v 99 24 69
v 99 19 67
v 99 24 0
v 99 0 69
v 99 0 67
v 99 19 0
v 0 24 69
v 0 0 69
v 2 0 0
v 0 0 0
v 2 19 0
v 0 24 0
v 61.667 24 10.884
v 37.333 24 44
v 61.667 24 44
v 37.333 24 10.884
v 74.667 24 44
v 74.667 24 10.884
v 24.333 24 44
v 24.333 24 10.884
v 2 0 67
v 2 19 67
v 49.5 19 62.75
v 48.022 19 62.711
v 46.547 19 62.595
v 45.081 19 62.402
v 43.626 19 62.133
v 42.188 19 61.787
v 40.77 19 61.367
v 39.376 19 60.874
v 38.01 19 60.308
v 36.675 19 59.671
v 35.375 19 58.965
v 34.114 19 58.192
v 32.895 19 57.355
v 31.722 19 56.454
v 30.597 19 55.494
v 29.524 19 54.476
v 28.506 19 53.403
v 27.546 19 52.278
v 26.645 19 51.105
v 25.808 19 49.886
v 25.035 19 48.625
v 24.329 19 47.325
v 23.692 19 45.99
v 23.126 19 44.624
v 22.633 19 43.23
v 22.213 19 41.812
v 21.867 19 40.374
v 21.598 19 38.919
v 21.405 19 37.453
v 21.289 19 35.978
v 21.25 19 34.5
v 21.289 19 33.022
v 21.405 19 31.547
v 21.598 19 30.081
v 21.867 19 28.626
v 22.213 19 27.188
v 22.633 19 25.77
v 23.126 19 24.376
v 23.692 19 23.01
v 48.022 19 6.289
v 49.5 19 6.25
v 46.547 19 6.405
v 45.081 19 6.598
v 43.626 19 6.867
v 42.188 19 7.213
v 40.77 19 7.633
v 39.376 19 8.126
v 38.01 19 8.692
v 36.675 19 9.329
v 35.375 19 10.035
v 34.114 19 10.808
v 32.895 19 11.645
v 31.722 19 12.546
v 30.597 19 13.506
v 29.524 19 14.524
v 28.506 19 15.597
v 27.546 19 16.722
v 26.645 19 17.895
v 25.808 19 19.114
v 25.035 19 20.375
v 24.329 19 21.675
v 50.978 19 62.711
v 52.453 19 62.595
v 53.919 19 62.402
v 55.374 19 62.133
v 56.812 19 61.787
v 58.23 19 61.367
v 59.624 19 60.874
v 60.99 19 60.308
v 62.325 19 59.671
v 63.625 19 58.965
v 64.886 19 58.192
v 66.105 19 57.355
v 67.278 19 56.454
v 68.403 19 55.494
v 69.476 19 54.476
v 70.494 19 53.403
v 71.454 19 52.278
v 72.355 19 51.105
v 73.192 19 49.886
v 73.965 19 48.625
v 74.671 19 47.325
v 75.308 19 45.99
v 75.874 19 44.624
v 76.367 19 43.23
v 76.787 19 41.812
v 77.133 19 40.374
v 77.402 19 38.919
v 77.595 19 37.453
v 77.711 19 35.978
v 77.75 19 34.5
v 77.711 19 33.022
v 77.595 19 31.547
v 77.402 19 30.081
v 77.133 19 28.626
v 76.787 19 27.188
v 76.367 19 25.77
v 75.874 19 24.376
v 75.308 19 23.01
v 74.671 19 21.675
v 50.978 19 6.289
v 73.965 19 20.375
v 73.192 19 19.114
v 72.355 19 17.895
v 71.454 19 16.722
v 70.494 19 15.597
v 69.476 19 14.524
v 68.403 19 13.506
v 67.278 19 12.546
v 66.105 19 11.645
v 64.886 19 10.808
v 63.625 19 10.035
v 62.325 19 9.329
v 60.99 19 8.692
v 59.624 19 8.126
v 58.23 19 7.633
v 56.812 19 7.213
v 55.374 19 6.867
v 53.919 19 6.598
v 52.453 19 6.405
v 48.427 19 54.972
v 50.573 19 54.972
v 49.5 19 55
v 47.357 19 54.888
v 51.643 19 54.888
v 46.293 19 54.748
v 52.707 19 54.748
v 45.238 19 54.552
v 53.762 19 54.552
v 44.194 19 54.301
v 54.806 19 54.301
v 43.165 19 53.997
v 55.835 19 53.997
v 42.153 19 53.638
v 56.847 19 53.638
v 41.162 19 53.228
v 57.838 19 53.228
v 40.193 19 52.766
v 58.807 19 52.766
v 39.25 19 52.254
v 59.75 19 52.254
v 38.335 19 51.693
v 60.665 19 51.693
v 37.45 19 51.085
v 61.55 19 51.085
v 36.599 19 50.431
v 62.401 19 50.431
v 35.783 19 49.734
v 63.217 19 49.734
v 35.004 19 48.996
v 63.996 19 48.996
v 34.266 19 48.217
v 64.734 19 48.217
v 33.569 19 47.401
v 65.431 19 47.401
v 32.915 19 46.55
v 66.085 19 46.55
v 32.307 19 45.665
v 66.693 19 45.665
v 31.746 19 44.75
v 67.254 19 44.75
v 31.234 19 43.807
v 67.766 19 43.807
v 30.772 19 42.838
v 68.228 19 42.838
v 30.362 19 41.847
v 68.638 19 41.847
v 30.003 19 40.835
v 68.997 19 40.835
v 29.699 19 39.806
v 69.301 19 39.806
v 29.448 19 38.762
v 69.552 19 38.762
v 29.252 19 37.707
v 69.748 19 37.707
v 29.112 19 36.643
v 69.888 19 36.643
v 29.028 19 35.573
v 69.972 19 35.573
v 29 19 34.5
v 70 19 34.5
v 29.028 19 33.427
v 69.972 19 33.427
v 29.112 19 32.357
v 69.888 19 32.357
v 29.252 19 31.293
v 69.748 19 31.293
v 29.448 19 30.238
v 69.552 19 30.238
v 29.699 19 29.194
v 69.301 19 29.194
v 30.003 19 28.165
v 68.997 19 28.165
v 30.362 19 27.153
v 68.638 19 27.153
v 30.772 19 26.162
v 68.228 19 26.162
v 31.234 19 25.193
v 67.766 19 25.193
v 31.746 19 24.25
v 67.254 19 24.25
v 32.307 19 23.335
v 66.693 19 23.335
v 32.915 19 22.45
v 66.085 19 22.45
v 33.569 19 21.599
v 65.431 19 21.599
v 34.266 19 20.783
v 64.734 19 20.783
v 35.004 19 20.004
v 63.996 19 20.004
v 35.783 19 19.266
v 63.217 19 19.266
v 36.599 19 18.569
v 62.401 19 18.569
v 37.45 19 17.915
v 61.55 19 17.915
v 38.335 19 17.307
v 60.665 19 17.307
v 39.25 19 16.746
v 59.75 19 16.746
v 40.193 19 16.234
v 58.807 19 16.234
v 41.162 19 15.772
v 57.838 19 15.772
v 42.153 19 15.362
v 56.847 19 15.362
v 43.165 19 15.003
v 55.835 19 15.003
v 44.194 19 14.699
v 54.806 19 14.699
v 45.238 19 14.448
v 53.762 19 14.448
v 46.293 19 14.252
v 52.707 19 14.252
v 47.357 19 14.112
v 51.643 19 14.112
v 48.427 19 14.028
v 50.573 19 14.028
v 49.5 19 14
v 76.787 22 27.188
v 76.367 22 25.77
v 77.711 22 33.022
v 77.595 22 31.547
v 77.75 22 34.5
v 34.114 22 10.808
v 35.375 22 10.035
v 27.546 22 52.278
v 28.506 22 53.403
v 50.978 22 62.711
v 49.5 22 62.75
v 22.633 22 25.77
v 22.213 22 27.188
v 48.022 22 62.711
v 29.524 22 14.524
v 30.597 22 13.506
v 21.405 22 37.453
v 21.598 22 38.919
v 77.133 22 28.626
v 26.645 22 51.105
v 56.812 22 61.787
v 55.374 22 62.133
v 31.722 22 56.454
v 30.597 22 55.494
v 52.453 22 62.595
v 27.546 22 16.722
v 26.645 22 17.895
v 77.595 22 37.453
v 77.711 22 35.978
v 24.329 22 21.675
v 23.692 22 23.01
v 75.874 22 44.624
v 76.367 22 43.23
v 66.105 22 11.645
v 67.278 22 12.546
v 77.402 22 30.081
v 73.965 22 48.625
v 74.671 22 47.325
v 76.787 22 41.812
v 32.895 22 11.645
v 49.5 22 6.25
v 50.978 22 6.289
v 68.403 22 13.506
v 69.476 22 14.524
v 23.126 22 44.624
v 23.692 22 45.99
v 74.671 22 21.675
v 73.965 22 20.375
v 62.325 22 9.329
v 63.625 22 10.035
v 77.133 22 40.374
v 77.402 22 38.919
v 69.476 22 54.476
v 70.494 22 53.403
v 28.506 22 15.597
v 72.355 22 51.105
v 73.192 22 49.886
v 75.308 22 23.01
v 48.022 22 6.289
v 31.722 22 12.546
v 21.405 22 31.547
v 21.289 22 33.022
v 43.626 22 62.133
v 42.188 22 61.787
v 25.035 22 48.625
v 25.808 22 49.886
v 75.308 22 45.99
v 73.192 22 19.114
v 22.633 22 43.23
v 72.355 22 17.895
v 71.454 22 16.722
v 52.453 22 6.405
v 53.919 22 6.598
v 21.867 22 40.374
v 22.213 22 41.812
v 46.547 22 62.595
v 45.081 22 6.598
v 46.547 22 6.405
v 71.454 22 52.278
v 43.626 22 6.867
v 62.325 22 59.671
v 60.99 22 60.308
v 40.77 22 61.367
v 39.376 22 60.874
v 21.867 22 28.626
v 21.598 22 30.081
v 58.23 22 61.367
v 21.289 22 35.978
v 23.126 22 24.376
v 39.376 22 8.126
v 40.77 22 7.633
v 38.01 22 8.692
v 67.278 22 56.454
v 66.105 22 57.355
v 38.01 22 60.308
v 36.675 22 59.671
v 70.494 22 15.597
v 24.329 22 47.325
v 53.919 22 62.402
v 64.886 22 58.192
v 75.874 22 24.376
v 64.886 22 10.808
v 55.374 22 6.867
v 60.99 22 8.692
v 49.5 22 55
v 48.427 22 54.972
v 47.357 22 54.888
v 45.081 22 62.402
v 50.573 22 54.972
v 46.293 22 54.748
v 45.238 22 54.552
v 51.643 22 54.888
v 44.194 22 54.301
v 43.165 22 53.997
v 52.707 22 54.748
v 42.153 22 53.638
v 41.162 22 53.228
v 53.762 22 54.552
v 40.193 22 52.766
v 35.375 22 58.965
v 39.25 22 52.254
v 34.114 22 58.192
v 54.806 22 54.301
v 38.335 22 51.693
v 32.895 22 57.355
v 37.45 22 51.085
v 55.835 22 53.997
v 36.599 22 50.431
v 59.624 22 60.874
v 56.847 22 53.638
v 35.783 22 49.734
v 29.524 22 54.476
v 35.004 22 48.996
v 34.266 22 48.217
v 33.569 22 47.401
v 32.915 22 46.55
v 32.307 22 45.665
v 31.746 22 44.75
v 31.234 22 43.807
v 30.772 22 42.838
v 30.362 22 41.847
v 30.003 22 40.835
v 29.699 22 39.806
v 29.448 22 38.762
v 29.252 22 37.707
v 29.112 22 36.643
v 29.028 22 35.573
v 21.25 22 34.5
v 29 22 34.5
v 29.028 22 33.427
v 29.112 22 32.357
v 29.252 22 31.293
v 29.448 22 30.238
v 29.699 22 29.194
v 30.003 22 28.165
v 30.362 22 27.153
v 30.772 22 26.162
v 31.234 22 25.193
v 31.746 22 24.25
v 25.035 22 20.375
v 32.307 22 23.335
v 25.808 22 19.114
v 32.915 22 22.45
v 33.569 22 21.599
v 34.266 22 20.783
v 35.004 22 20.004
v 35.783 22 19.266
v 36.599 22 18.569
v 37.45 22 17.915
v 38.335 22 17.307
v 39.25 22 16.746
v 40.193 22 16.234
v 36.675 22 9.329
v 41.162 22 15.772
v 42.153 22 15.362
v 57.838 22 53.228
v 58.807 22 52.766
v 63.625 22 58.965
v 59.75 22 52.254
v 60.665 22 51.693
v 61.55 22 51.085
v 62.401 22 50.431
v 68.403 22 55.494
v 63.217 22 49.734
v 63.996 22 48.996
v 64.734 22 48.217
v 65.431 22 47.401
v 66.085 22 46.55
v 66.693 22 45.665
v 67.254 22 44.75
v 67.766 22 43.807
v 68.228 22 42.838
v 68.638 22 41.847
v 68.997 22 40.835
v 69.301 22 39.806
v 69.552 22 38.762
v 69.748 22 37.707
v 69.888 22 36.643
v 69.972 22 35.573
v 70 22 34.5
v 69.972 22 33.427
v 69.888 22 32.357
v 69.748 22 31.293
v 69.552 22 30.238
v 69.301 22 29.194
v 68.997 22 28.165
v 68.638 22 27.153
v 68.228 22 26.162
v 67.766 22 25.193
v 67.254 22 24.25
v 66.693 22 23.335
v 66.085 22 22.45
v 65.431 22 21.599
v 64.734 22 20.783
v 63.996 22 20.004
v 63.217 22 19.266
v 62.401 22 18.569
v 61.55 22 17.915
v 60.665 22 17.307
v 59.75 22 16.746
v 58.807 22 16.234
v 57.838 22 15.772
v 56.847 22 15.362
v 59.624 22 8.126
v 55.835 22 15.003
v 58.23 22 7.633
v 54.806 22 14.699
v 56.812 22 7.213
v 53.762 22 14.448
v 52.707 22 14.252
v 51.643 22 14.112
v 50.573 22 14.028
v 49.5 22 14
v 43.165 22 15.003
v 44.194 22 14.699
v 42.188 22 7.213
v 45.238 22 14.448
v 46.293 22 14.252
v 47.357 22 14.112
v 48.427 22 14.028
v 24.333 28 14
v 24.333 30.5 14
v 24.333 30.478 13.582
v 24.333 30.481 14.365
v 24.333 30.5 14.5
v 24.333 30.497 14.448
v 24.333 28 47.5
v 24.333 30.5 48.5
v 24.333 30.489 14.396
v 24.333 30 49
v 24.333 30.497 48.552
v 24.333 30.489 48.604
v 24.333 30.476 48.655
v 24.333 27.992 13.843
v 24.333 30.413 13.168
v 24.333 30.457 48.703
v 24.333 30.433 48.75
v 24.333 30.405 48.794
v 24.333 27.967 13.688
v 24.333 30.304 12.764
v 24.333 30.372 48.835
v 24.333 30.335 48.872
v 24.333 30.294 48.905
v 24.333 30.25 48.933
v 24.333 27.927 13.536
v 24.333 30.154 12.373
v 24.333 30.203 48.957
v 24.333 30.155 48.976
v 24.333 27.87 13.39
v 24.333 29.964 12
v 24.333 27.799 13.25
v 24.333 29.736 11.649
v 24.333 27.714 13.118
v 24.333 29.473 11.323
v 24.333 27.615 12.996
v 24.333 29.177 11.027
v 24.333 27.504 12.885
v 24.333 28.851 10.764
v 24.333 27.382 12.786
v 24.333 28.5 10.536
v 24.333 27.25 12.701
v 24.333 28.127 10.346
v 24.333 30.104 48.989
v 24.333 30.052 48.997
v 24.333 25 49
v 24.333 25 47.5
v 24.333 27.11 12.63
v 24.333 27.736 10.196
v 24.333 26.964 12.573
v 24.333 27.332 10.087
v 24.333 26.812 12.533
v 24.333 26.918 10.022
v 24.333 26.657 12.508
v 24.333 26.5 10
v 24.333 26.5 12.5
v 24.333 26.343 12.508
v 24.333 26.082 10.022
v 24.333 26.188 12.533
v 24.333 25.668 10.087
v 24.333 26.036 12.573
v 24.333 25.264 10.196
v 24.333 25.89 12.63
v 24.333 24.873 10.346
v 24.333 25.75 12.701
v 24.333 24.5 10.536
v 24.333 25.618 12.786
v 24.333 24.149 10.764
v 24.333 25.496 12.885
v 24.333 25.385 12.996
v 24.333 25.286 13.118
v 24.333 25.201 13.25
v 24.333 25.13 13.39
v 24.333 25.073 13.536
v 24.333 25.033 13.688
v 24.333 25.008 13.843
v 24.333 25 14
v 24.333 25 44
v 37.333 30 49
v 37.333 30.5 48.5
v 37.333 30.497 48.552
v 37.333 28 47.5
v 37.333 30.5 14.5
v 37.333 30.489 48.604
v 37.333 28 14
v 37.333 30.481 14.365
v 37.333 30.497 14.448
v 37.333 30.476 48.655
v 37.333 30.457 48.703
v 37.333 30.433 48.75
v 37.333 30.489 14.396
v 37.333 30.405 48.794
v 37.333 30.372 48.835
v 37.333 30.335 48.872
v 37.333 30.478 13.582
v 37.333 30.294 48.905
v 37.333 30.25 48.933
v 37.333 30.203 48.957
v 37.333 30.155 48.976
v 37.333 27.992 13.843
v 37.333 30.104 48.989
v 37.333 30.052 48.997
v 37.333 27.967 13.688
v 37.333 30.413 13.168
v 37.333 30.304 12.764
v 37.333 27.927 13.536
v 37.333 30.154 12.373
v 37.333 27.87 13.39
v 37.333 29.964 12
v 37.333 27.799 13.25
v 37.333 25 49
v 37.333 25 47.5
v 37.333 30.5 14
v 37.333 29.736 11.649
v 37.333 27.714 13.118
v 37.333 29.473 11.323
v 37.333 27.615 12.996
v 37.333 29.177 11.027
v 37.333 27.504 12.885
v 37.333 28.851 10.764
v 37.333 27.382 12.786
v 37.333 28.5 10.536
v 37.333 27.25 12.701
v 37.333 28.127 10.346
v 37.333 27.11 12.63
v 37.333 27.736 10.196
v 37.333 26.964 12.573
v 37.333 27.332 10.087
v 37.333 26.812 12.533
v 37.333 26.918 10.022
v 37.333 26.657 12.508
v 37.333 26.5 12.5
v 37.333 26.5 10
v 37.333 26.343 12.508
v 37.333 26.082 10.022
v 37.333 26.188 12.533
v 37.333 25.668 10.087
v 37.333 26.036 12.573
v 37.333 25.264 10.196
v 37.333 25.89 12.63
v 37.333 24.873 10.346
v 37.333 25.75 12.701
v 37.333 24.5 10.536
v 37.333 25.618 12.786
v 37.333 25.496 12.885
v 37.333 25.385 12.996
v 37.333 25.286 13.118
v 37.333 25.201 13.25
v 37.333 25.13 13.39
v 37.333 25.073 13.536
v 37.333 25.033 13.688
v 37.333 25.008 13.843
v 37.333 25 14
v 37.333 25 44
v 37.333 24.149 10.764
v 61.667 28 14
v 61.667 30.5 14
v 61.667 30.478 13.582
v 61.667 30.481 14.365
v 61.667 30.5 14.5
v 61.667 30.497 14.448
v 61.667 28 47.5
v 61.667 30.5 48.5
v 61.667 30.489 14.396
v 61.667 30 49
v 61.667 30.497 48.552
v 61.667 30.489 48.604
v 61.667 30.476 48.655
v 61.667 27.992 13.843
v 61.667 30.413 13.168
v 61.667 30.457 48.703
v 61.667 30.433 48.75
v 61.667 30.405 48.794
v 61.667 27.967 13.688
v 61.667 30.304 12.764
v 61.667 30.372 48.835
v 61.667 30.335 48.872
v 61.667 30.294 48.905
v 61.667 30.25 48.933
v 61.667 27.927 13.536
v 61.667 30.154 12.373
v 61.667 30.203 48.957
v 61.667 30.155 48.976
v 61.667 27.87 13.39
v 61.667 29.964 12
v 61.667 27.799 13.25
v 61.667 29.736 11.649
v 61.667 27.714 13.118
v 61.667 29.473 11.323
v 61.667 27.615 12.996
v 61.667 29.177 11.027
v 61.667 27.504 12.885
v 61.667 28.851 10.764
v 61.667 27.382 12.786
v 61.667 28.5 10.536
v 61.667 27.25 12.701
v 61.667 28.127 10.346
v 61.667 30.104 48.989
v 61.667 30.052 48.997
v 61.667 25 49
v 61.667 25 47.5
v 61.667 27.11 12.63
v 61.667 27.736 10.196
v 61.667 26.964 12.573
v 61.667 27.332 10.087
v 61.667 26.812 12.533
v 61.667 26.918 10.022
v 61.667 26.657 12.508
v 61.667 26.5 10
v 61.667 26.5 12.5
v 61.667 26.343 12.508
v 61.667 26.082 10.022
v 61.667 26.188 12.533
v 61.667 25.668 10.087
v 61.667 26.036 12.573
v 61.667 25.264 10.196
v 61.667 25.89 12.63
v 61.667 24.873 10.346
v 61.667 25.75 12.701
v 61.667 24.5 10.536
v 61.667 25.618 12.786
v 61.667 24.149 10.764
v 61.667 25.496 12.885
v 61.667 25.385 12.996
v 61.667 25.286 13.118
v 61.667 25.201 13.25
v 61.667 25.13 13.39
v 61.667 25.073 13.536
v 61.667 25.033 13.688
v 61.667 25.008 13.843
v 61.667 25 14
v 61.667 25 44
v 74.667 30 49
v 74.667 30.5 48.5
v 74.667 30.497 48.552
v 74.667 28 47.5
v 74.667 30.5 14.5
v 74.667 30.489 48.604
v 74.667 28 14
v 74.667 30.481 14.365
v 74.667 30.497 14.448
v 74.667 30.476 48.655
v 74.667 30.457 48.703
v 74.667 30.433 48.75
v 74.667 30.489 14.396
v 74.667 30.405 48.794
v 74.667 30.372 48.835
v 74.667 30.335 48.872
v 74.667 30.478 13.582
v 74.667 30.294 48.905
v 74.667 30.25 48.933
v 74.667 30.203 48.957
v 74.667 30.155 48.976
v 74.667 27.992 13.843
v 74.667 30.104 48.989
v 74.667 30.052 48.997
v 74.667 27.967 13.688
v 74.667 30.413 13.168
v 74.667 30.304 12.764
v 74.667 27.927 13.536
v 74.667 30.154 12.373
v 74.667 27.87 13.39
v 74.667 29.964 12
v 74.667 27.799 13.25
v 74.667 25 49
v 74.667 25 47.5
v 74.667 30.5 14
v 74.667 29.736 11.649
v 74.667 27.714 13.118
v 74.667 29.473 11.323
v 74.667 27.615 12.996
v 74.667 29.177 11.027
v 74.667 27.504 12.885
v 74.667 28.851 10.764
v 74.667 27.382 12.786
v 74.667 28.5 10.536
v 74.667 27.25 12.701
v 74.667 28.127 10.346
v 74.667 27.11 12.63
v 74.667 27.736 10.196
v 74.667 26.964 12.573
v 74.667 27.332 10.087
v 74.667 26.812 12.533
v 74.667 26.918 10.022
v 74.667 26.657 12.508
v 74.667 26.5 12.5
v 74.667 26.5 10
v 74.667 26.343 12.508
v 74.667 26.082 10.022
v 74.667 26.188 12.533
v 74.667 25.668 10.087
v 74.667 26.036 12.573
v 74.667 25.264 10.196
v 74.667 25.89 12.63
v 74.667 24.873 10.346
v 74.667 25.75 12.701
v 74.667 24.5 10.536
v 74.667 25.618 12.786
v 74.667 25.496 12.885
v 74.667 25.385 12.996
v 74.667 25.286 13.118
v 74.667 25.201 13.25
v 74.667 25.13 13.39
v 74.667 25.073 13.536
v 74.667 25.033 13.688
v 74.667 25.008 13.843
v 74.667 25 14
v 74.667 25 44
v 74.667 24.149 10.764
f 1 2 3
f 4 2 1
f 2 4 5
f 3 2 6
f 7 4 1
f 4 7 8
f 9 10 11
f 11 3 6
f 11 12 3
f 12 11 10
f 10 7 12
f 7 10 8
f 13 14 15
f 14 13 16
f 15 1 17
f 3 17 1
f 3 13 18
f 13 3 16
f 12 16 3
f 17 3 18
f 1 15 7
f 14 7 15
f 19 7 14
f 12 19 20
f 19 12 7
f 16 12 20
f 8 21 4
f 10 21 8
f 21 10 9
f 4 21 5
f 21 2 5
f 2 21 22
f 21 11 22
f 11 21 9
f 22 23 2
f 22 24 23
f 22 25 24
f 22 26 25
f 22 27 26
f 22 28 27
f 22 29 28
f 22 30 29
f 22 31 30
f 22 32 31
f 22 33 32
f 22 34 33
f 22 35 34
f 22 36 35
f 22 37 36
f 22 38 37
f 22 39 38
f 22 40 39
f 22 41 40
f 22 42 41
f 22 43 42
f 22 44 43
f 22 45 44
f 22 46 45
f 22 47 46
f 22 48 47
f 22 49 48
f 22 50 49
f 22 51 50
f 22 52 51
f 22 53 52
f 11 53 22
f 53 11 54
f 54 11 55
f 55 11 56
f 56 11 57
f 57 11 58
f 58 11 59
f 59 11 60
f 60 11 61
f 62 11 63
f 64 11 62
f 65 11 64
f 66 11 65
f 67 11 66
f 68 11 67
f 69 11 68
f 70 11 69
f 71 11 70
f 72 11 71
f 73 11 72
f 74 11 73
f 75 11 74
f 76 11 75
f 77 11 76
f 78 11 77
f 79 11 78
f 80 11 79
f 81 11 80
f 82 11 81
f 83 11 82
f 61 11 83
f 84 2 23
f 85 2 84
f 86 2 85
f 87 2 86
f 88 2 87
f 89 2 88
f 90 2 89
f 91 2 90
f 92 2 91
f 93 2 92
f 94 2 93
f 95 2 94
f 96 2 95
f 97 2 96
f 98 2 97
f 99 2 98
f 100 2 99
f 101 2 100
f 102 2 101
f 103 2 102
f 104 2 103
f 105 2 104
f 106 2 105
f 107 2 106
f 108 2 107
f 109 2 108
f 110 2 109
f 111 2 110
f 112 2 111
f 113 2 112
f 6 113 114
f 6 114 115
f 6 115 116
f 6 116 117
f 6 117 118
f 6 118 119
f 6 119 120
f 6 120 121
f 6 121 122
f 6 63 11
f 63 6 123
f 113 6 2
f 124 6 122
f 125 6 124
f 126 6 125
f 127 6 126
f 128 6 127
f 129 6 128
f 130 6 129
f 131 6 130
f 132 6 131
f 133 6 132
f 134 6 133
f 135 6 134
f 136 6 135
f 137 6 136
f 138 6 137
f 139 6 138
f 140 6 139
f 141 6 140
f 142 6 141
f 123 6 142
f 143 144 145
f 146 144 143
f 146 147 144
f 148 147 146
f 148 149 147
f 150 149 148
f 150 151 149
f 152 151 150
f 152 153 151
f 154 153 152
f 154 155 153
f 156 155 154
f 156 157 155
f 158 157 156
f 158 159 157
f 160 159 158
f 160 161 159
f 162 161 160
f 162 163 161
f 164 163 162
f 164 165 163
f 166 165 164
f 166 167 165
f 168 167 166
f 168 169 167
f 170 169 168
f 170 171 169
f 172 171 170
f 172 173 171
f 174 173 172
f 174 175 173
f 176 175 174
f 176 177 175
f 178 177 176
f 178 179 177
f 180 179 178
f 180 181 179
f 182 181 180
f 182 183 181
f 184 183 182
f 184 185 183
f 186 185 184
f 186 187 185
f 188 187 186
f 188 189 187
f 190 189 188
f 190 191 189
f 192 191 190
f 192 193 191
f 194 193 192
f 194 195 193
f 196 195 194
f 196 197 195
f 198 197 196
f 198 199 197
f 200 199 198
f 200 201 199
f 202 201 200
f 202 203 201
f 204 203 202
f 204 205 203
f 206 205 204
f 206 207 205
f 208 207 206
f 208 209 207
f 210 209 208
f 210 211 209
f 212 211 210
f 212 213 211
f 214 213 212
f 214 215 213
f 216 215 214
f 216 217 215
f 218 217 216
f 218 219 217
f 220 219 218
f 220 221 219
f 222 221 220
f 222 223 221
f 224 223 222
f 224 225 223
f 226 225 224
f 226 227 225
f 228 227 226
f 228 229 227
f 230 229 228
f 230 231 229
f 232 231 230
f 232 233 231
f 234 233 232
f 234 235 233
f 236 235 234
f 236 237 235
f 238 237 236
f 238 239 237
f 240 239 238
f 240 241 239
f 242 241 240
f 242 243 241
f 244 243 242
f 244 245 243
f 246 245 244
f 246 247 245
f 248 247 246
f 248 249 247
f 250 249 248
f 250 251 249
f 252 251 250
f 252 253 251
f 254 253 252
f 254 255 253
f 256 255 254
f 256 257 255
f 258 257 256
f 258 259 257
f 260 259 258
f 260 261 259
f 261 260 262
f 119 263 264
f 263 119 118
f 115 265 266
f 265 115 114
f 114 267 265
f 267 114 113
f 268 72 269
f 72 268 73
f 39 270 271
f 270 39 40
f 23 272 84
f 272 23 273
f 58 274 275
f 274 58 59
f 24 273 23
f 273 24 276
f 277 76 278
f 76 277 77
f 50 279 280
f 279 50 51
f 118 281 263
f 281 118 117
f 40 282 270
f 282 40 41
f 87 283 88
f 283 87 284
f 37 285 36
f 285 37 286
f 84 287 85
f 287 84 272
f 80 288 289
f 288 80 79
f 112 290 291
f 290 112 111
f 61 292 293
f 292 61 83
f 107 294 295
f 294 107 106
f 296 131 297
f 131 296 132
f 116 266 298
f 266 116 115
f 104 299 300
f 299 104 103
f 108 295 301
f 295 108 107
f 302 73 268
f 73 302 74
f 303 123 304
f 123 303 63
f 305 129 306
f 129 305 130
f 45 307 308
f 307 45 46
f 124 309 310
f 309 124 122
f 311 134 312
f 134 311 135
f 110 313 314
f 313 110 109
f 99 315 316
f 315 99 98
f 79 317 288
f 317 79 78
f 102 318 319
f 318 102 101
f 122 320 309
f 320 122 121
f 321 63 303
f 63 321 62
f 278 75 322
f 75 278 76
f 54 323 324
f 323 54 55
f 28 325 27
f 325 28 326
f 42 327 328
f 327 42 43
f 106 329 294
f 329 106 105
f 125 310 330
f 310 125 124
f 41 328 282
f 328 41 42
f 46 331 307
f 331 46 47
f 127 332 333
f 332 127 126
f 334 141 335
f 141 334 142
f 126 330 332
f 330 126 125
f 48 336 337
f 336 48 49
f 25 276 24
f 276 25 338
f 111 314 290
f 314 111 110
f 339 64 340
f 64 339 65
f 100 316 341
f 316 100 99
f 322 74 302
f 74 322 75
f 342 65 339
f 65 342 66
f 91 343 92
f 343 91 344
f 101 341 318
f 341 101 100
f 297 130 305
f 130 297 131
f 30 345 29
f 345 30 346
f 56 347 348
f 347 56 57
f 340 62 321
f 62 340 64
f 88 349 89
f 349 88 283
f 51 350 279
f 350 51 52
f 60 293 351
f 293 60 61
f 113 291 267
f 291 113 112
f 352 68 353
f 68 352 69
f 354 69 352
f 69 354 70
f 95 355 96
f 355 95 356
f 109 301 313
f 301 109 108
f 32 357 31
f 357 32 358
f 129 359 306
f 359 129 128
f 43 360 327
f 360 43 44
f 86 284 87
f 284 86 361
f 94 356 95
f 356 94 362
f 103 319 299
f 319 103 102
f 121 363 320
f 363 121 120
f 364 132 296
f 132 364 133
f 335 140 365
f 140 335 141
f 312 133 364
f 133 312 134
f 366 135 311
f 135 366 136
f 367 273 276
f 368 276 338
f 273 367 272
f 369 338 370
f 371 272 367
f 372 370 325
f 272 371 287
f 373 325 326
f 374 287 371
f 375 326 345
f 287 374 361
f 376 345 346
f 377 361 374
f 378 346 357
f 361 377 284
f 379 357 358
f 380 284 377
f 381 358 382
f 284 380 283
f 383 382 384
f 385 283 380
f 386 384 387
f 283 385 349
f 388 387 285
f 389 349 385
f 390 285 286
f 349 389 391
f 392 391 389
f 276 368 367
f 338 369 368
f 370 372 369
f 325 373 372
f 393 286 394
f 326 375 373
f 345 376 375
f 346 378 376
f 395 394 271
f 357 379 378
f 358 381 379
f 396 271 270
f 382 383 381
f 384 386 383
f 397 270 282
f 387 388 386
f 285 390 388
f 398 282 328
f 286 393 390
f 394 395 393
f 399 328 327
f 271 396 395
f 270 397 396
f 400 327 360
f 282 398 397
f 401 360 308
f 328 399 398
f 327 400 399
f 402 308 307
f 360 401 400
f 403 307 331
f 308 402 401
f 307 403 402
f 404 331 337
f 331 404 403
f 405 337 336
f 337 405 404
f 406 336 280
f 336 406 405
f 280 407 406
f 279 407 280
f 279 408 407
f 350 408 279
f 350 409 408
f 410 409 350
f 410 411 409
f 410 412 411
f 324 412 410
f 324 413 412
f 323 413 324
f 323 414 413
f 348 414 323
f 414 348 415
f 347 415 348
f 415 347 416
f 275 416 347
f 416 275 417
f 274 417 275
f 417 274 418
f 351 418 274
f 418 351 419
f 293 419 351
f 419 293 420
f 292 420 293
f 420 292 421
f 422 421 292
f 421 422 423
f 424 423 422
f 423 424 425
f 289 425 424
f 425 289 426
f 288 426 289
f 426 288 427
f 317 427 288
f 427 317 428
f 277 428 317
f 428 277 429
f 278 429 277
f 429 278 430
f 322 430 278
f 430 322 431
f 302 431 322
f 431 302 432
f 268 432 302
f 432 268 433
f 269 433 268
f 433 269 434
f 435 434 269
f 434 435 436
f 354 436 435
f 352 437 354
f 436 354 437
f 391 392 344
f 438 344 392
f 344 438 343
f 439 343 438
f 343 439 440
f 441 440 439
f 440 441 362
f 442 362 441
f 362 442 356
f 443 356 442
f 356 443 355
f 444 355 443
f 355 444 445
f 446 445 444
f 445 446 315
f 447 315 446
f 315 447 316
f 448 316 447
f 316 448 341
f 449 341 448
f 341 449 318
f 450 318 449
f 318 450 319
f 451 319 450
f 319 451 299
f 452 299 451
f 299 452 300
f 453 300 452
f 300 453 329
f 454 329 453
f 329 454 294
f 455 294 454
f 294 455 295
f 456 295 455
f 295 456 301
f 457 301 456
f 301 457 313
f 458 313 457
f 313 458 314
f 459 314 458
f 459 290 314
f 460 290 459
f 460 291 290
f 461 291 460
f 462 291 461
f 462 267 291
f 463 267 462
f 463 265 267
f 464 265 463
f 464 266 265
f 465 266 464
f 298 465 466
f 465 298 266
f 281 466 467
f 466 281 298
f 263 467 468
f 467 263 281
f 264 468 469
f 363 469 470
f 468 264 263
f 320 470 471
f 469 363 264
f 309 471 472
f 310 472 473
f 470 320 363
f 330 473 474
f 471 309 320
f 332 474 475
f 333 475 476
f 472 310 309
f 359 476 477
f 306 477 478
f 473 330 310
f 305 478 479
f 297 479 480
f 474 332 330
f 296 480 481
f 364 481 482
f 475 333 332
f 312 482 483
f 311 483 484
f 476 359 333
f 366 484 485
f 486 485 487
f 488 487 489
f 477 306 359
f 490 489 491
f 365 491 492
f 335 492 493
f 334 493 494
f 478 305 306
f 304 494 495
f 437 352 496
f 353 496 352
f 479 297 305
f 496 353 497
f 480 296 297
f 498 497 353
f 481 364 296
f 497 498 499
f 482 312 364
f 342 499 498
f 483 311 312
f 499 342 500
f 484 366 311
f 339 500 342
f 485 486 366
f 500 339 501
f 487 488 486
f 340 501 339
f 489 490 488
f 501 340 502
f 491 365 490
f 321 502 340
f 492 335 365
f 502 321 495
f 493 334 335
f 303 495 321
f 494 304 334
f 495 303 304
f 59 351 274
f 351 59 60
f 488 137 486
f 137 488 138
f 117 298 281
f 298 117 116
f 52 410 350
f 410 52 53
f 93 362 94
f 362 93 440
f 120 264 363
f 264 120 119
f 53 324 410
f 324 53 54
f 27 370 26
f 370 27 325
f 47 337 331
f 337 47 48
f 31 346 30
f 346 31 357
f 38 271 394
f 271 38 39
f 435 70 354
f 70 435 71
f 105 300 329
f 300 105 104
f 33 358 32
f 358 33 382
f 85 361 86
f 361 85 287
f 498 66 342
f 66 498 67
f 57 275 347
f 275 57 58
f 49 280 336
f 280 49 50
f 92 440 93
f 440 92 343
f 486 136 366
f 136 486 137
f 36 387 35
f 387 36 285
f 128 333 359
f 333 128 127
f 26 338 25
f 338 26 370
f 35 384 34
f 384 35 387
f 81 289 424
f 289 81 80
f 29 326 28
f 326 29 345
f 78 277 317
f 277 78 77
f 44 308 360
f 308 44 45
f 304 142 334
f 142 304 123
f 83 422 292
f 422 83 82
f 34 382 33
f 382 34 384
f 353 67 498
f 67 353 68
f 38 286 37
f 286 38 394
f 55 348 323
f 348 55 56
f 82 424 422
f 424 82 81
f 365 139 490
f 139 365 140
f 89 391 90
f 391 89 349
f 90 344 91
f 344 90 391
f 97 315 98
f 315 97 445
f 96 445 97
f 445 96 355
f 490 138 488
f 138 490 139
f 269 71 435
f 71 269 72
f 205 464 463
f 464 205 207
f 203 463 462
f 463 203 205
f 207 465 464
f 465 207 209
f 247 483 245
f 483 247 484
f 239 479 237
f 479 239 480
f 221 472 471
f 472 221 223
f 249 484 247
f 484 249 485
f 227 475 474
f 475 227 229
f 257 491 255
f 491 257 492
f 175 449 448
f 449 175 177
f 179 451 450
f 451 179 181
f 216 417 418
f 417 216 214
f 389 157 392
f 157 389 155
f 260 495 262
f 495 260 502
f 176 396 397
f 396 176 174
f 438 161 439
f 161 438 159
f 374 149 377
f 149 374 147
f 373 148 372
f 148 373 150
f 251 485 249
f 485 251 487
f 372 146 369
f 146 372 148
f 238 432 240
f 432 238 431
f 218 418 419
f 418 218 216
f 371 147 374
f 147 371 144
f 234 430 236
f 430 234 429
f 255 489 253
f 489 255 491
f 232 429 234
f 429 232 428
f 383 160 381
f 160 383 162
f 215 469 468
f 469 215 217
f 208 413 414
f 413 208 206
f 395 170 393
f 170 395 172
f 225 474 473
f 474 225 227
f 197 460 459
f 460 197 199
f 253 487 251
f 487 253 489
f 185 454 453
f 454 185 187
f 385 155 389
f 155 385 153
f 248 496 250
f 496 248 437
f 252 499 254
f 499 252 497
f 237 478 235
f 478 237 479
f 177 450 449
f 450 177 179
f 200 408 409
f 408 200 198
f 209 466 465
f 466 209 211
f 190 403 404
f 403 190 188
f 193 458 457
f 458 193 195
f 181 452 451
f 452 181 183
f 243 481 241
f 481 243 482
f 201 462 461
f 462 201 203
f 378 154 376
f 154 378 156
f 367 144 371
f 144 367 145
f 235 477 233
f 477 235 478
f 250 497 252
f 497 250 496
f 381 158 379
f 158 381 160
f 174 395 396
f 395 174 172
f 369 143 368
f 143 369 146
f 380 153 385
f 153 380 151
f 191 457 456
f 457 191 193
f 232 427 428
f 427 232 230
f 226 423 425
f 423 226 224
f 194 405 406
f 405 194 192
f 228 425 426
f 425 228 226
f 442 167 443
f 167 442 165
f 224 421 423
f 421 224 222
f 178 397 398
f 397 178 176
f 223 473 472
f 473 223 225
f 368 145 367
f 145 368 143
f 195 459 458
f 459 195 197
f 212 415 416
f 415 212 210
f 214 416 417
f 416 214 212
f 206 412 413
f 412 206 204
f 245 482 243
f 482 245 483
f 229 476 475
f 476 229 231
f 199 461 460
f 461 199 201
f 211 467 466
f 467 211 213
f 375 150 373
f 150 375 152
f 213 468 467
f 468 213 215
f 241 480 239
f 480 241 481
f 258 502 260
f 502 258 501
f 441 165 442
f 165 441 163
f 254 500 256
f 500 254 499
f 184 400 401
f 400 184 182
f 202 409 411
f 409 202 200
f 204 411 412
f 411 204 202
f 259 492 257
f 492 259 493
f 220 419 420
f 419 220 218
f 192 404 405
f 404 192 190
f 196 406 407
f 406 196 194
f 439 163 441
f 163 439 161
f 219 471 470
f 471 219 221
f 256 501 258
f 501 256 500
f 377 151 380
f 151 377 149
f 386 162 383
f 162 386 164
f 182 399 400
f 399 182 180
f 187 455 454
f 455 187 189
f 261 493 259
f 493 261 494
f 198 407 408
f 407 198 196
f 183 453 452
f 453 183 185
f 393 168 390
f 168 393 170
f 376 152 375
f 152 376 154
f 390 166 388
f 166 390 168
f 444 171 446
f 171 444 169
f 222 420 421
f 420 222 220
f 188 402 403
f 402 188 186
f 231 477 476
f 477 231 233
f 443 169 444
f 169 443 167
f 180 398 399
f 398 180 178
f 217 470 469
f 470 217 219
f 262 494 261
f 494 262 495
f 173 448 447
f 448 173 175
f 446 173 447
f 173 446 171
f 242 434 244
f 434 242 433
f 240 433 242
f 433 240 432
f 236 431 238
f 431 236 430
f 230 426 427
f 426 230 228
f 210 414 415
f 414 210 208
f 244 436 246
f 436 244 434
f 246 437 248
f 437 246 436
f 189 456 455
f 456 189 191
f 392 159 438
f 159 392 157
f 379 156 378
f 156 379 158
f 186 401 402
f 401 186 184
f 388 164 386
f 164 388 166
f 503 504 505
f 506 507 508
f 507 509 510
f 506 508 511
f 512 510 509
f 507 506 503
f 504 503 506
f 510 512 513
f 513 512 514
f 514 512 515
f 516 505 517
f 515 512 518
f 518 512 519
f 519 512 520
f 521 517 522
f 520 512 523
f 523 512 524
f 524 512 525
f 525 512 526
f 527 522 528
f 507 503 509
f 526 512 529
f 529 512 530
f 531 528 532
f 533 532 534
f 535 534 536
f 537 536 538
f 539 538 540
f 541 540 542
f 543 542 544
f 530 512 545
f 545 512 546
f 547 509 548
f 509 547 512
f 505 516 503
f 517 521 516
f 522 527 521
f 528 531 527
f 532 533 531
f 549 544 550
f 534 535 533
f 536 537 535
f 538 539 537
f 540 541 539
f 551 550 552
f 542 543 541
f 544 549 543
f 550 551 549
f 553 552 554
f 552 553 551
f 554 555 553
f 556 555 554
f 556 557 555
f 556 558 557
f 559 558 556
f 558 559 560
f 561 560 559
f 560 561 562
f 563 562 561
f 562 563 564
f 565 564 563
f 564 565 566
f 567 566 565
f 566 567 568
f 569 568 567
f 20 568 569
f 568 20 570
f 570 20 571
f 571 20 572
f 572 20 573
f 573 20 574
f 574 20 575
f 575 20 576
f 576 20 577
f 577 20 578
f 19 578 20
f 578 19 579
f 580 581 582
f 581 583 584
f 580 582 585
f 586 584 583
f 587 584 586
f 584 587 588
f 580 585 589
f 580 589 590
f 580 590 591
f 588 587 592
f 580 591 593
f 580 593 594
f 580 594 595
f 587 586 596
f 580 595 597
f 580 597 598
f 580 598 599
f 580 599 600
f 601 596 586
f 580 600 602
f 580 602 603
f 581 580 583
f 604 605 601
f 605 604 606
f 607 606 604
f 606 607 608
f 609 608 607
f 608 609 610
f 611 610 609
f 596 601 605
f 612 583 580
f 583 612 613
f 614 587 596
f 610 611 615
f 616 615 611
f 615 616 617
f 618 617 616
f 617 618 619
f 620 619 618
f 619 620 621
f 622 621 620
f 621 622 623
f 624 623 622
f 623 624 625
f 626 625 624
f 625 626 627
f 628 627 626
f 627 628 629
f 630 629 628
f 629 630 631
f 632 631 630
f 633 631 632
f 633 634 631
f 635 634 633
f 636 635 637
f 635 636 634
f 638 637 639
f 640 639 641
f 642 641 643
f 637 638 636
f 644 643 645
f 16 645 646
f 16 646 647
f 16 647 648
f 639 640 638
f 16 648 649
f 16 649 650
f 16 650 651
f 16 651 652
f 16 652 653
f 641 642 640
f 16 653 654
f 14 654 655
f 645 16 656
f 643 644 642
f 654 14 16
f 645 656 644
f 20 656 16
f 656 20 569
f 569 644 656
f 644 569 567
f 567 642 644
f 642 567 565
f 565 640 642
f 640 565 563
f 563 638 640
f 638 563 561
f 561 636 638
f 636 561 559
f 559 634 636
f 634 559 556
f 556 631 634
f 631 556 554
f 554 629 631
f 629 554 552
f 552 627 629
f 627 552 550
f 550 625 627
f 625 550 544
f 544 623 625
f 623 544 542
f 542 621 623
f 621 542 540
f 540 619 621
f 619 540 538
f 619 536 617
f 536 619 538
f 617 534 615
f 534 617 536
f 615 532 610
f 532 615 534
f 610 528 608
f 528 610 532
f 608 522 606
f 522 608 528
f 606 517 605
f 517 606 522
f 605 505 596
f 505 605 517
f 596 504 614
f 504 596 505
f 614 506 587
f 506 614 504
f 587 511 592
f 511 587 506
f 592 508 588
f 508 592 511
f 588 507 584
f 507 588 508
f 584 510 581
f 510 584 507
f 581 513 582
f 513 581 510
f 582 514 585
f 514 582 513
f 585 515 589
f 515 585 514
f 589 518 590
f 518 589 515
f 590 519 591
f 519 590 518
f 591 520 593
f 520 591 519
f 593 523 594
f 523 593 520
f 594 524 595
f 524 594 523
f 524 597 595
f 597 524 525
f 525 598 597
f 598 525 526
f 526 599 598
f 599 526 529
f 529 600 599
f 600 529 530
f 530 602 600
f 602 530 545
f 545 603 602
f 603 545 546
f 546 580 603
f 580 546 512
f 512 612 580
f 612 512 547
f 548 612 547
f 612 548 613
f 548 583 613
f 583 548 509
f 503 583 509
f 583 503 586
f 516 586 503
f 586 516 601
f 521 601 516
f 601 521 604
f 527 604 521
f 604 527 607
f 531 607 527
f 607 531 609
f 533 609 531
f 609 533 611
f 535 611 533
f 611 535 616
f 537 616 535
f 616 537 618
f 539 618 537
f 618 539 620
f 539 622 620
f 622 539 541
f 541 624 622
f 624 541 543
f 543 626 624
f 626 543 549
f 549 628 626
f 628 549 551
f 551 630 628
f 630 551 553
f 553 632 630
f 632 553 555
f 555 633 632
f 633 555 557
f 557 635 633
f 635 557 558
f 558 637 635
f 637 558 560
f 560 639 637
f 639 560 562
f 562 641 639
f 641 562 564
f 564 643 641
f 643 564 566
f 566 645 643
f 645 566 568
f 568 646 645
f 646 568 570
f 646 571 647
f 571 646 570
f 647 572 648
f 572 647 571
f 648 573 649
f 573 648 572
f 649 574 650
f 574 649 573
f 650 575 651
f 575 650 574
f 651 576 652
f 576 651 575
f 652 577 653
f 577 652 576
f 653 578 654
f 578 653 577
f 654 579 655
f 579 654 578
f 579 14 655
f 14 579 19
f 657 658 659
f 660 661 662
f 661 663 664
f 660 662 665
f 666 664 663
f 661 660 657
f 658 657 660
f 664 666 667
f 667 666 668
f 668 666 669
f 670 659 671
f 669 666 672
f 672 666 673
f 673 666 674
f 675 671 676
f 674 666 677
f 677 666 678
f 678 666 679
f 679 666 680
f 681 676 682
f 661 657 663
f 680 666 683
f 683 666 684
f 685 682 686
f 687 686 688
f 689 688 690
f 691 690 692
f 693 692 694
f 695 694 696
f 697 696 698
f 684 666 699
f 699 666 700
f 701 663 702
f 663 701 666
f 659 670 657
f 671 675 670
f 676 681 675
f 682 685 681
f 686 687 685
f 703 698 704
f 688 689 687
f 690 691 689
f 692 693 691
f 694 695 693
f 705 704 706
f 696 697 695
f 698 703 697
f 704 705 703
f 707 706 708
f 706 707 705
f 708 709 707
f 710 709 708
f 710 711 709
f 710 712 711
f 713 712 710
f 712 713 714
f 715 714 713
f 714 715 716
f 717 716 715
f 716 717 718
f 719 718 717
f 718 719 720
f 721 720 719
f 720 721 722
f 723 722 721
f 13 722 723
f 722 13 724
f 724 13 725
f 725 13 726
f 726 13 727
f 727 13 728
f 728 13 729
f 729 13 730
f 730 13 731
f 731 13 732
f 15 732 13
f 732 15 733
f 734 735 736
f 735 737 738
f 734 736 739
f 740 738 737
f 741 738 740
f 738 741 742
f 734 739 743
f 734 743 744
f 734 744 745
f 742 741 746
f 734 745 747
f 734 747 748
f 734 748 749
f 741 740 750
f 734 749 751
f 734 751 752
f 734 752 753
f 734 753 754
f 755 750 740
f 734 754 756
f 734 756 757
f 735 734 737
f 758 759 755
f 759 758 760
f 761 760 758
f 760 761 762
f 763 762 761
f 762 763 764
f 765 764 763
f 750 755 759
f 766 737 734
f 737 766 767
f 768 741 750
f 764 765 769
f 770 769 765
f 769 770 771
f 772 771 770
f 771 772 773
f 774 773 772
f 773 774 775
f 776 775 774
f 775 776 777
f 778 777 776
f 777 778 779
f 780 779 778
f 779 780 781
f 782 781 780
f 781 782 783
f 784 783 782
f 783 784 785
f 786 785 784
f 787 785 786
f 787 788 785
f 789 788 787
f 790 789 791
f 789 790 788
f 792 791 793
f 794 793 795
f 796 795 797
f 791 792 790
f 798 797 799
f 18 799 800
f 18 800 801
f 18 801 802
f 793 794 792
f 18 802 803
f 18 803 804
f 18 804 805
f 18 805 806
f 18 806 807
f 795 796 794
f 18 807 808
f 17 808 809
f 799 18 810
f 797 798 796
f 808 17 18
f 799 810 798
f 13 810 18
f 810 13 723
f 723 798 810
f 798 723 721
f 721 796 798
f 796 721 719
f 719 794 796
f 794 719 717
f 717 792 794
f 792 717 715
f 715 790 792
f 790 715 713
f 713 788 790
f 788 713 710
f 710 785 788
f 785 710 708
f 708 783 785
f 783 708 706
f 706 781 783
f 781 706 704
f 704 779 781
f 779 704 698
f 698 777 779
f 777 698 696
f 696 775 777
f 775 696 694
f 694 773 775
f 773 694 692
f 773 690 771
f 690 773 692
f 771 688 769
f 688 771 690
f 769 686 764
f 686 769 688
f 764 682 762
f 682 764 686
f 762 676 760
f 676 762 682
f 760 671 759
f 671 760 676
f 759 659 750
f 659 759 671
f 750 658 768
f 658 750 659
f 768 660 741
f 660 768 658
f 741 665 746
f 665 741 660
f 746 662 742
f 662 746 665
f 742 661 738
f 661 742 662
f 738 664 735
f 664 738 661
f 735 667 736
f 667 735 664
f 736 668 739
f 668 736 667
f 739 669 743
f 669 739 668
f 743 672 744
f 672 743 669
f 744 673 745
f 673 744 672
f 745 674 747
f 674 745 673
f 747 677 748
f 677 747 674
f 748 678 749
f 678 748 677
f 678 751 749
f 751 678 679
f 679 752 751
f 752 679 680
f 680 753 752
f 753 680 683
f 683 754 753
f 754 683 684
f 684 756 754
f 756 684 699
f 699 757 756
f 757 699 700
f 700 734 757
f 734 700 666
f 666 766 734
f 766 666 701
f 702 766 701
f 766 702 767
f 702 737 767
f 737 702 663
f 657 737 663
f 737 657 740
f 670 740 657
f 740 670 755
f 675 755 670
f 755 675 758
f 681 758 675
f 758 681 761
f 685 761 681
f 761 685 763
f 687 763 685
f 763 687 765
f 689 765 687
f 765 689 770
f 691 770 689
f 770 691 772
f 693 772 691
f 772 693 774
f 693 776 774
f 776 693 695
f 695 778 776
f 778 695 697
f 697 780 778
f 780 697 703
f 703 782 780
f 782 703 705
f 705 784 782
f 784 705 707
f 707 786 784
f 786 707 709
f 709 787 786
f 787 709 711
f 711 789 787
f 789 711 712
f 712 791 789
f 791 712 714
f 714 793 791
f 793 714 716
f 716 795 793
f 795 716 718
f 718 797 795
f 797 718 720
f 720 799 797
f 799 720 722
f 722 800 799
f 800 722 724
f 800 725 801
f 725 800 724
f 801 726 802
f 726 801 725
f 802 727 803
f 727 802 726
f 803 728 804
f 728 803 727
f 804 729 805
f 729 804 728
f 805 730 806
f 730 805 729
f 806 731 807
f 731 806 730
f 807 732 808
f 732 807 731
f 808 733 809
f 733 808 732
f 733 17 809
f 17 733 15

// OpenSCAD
////////////////////
// Quest3 バッテリーホルダー（マグネット埋め込み版）
// 元: quest_battry_holder/20251227_battrey_02.scad
// 変更点:
//   - リングマグネット（外径56 / 内径41.5 / 厚3mm）の溝を底板(+Y壁)に追加
//   - 底板(+Y壁)を外側へ増肉して板厚を確保（wall + plate_extra）
//   - 3面構成: 底板(+Y壁) + 側面(-X壁) + 上蓋(99x21)。前面(-Y)と+X側を開放
////////////////////

////////////////////
// パラメータ（元モデル）
////////////////////
box_w = 99;   // 幅（X）
box_d = 17;   // 奥行き（Y）※内側空洞の奥行き
box_h = 69;   // 高さ（Z）
wall  = 2.0;  // 箱の肉厚

// 元: 切り欠き
slot_w = 1;
slot_d = 5;
slot_off = -2;

// 元: バッテリーインジケータの切り欠き
indicator_w = 20;
indicator_d = 20;

// 元: ベルトループ
loop_extrude = 13;
loop_h       = 39;
loop_thick   = 2.5;
loop_gap_h   = 35;
loop_r       = 0.5;
loop_pos_z   = 10;

////////////////////
// 追加パラメータ（マグネット / 増肉）
////////////////////
// リングマグネット実寸
mag_od = 56.0;  // 外径
mag_id = 41.5;  // 内径
mag_t  = 3.0;   // 厚み

// 溝の逃げ・深さ
mag_clr    = 0.25; // 外周の逃げ（片側）。溝径 = mag_od + 2*mag_clr
mag_clr_id = 0.25; // 中心支柱の逃げ（片側）。支柱径 = mag_id - 2*mag_clr_id
mag_depth  = mag_t;       // 溝の深さ＝磁石厚。磁石面を内面と面一にする（隙間0で鉄板に密着）

// 底板(+Y壁)の増肉量。板厚 = wall + plate_extra
// 5.0mm -> 溝底の残り肉厚 = (wall+plate_extra) - mag_depth = 2.0mm（面一・厚3mm磁石）
// 4.0mm -> 残り 1.0mm（薄いので非推奨）
plate_extra = 3.0; // 既定: 板厚 5.0mm

// 磁石中心（底板の内面、X-Z平面）
mag_cx = box_w/2;  // 中央
mag_cz = box_h/2;  // 中央

// 底板(+Y壁)の内面Y / 外面Y
y_inner = box_d + wall;                 // = 19
y_outer = box_d + wall + wall + plate_extra; // = 24（板厚 5.0mm 時）

// ベルトループ位置（増肉分だけ外側へ）
loop_offsetY = -1.5 + 2*wall + plate_extra;

////////////////////
// メイン形状
////////////////////
module main_box() {
  difference() {
    difference() {
      // 外殻（+Y壁を外側へ増肉）
      cube([box_w, box_d + 2*wall + plate_extra, box_h], center=false);

      // 空洞
      //   X: wall .. box_w        -> -X壁のみ残す（+X側 開放）
      //   Y: 0 .. y_inner         -> -Y壁を除去（前面 開放）
      //   Z: 0 .. box_h-wall      -> 下開放 / 上蓋(-wall..0)を残す
      translate([wall, 0, 0])
        cube([box_w - wall, y_inner, box_h - wall], center=false);
    }

    // 磁石溝（底板の内面にリング状の座ぐり）
    magnet_pocket();

    // インジケータの切り欠き（元。前面開放により実質無効だが形状維持のため残置）
    translate([box_w - indicator_w, -wall, 0]) {
      cube([indicator_w, 3*wall, indicator_d], center=false);
    }
  }
}

// リングマグネット用の環状ポケット
//   - 内面(y_inner)から +Y 方向へ mag_depth だけ彫る
//   - 中心は支柱として残す（支柱径 = mag_id - 2*mag_clr_id）
module magnet_pocket() {
  translate([mag_cx, y_inner - 0.01, mag_cz])
    rotate([-90, 0, 0])
      difference() {
        cylinder(h = mag_depth + 0.01, d = mag_od + 2*mag_clr, center=false, $fn=120);
        cylinder(h = mag_depth + 1.0,   d = mag_id - 2*mag_clr_id, center=false, $fn=120);
      }
}

main_box();
belt_loops();

////////////////////
// ベルトループ（元形状・配置のみ増肉分シフト）
////////////////////
module belt_loop_profile() {
  outer_w = loop_thick*2 + 3;
  bottom_r = outer_w / 2;
  inner_w = outer_w - loop_thick * 2;
  inner_bottom_r = inner_w / 2;
  inner_bottom_y = loop_thick + inner_bottom_r;
  inner_top_y = loop_thick + loop_gap_h;
  $fn = 60;

  difference() {
    union() {
      translate([bottom_r, bottom_r])
        circle(r=bottom_r);
      translate([0, bottom_r])
        offset(r=loop_r) offset(delta=-loop_r)
          square([outer_w, loop_h - bottom_r]);
    }
    union() {
      translate([outer_w/2, inner_bottom_y])
        circle(r=inner_bottom_r);
      translate([loop_thick, inner_bottom_y])
        square([inner_w, inner_top_y - inner_bottom_y]);
    }
    translate([
      outer_w/2 - slot_w/2 + slot_off,
      loop_h - slot_d
    ])
      square([slot_w, slot_d+1], center=false);
  }
}

module belt_loop() {
  rotate([90,0,90])
    linear_extrude(height = loop_extrude, center=false)
      belt_loop_profile();
}

module belt_loops() {
  space = (box_w - 2*loop_extrude) / 3;
  translate([space,
             box_d + loop_offsetY,
             loop_pos_z])
    belt_loop();
  translate([2*space + loop_extrude,
             box_d + loop_offsetY,
             loop_pos_z])
    belt_loop();
}
